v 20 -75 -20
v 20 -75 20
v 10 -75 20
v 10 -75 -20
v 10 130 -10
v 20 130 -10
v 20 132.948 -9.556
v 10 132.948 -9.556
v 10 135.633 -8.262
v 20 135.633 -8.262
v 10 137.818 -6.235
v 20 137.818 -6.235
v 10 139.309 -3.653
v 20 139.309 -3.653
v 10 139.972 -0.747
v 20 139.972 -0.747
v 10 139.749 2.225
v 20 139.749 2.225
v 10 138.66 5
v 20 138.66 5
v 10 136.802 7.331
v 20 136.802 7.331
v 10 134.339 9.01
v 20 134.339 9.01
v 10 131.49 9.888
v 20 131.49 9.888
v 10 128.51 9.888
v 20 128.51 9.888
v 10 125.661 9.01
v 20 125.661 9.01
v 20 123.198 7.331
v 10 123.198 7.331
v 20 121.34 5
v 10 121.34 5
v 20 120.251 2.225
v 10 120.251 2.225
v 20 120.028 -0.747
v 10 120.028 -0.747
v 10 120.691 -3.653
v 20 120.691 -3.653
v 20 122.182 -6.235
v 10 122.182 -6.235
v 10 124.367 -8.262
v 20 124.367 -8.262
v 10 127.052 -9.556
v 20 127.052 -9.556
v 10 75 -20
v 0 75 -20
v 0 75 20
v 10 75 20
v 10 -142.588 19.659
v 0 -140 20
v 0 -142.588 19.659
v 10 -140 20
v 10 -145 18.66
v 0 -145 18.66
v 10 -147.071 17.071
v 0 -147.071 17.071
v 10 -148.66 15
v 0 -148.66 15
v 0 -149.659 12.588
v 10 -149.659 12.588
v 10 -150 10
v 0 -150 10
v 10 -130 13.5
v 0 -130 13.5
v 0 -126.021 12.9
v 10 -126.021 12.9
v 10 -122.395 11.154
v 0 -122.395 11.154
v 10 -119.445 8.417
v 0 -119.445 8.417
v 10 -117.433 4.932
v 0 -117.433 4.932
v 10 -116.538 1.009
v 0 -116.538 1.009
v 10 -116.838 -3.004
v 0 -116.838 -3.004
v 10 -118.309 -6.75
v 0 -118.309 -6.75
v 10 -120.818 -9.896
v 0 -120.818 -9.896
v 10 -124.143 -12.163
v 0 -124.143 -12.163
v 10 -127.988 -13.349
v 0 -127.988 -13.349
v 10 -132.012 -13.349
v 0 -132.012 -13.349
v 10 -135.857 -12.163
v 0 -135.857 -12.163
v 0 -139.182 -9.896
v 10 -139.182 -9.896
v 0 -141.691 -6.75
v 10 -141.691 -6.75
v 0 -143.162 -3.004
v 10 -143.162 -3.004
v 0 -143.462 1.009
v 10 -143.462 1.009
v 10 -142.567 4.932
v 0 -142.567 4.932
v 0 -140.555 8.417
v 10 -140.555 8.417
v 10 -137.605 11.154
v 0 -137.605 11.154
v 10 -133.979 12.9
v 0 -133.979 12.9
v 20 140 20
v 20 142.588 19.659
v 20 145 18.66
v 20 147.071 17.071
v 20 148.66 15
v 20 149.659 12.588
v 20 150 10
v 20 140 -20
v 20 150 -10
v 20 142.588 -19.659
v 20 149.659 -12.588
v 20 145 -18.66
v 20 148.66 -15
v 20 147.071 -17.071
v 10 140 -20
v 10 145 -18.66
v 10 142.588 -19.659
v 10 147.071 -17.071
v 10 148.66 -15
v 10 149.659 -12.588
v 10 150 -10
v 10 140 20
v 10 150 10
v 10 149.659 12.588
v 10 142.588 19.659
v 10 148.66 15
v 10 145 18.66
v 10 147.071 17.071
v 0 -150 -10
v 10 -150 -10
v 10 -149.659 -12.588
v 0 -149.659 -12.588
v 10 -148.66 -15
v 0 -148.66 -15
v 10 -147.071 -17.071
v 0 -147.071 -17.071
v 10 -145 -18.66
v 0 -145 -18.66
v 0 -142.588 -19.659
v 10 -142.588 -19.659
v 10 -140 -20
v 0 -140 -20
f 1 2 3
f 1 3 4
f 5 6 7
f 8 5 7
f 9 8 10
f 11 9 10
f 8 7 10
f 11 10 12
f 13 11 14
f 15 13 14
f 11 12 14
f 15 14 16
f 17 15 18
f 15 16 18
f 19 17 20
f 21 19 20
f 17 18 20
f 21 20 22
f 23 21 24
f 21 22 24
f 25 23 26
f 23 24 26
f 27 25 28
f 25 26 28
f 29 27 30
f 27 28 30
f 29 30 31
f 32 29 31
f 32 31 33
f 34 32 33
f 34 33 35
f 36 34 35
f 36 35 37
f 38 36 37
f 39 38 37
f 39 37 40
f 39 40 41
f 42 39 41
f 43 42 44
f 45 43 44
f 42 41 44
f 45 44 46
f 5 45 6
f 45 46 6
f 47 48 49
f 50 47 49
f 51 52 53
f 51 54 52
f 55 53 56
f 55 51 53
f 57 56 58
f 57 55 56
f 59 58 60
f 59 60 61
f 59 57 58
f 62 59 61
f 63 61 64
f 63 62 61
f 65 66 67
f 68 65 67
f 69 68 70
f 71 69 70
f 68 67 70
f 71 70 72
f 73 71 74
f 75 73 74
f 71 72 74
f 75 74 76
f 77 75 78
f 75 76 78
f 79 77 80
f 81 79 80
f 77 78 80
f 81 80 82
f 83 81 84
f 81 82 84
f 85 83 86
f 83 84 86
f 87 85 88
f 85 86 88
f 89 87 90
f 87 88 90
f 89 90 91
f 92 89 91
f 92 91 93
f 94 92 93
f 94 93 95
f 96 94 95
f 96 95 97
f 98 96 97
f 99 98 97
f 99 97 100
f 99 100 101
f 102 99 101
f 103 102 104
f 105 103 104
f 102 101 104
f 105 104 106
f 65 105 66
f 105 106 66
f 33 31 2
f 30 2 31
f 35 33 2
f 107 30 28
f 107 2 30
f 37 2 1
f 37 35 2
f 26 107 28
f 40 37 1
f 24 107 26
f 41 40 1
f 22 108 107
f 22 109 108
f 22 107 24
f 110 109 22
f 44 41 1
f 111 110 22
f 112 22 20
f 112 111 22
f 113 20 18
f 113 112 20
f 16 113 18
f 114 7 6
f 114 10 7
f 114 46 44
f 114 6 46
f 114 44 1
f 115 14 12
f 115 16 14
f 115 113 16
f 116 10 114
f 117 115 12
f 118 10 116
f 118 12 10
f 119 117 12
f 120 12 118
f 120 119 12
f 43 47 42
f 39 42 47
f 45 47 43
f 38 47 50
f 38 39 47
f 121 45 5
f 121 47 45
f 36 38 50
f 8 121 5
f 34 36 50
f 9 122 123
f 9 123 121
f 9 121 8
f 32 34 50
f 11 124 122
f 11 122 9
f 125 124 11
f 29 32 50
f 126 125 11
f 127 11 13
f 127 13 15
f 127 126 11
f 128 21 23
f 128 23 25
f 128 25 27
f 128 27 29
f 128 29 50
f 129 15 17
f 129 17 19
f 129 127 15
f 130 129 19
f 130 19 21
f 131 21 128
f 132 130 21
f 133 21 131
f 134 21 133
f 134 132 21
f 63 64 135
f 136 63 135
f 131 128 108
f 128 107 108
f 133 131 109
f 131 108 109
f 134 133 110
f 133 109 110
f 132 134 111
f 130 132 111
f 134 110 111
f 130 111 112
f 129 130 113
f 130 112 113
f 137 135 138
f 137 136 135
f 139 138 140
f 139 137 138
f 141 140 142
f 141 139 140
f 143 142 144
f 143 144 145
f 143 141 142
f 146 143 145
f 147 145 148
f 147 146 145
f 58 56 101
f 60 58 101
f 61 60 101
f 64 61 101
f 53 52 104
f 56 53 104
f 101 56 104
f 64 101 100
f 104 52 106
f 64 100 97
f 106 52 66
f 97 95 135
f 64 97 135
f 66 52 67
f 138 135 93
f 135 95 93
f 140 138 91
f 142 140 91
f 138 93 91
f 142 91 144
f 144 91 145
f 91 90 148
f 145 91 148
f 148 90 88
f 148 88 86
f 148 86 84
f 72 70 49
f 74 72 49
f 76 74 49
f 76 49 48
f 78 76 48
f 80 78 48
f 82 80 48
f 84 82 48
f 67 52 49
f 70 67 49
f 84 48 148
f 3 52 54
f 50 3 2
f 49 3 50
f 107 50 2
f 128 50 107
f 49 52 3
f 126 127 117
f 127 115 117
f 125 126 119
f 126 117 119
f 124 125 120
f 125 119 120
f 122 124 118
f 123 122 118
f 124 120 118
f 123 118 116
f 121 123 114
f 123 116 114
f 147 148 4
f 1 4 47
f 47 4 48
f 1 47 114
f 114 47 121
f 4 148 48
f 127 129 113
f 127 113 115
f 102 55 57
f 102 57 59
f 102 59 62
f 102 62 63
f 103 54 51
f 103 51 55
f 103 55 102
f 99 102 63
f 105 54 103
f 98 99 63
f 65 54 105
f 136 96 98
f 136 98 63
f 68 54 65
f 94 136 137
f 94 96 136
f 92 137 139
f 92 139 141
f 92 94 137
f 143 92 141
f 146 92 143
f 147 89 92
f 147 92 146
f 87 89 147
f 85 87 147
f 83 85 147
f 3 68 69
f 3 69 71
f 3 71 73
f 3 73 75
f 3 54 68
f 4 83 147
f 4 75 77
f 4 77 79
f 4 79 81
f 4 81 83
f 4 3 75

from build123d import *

# Parameters (mm, degrees)
SKETCH1_W           = 40
SKETCH1_H           = 300
BOSS_EXTRUDE1_DEPTH = 20
SKETCH2_W           = 40
SKETCH2_H           = 75
CUT_EXTRUDE1_DEPTH  = 10
SKETCH3_W           = 40
SKETCH3_H           = 75
CUT_EXTRUDE2_DEPTH  = 10
SKETCH4_R           = 13.5
CUT_EXTRUDE3_DEPTH  = 10
FILLET1_R           = 10
SKETCH5_R           = 10
CUT_EXTRUDE4_DEPTH  = 10


with BuildPart() as part:
    # Sketch1 → Boss-Extrude1 (new body)
    with BuildSketch(Plane(origin=(0, 0, 0), x_dir=(0, 0, -1), z_dir=(1, 0, 0))):
        Rectangle(SKETCH1_W, SKETCH1_H)
    extrude(amount=BOSS_EXTRUDE1_DEPTH)

    # Sketch2 → Cut-Extrude1 (cut)
    with BuildSketch(Plane.ZY):
        with Locations((0, 112.5)):
            Rectangle(SKETCH2_W, SKETCH2_H)
    extrude(amount=-CUT_EXTRUDE1_DEPTH, mode=Mode.SUBTRACT)

    # Sketch3 → Cut-Extrude2 (cut)
    with BuildSketch(Plane(origin=(20, 0, 0), x_dir=(0, 0, -1), z_dir=(1, 0, 0))):
        with Locations((0, -112.5)):
            Rectangle(SKETCH3_W, SKETCH3_H)
    extrude(amount=-CUT_EXTRUDE2_DEPTH, mode=Mode.SUBTRACT)

    # Sketch4 → Cut-Extrude3 (cut)
    with BuildSketch(Plane.ZY):
        with Locations((0, -130)):
            Circle(SKETCH4_R)
    extrude(amount=-CUT_EXTRUDE3_DEPTH, mode=Mode.SUBTRACT)

    # Fillet1
    fillet1_edges = [part.edges().sort_by_distance(p)[0] for p in [
        (5, -150, -20),
        (5, -150, 20),
        (15, 150, 20),
        (15, 150, -20),
    ]]
    fillet(fillet1_edges, radius=FILLET1_R)

    # Sketch5 → Cut-Extrude4 (cut)
    with BuildSketch(Plane(origin=(20, 0, 0), x_dir=(0, 0, -1), z_dir=(1, 0, 0))):
        with Locations((0, 130)):
            Circle(SKETCH5_R)
    extrude(amount=-CUT_EXTRUDE4_DEPTH, mode=Mode.SUBTRACT)


solid = part.part
